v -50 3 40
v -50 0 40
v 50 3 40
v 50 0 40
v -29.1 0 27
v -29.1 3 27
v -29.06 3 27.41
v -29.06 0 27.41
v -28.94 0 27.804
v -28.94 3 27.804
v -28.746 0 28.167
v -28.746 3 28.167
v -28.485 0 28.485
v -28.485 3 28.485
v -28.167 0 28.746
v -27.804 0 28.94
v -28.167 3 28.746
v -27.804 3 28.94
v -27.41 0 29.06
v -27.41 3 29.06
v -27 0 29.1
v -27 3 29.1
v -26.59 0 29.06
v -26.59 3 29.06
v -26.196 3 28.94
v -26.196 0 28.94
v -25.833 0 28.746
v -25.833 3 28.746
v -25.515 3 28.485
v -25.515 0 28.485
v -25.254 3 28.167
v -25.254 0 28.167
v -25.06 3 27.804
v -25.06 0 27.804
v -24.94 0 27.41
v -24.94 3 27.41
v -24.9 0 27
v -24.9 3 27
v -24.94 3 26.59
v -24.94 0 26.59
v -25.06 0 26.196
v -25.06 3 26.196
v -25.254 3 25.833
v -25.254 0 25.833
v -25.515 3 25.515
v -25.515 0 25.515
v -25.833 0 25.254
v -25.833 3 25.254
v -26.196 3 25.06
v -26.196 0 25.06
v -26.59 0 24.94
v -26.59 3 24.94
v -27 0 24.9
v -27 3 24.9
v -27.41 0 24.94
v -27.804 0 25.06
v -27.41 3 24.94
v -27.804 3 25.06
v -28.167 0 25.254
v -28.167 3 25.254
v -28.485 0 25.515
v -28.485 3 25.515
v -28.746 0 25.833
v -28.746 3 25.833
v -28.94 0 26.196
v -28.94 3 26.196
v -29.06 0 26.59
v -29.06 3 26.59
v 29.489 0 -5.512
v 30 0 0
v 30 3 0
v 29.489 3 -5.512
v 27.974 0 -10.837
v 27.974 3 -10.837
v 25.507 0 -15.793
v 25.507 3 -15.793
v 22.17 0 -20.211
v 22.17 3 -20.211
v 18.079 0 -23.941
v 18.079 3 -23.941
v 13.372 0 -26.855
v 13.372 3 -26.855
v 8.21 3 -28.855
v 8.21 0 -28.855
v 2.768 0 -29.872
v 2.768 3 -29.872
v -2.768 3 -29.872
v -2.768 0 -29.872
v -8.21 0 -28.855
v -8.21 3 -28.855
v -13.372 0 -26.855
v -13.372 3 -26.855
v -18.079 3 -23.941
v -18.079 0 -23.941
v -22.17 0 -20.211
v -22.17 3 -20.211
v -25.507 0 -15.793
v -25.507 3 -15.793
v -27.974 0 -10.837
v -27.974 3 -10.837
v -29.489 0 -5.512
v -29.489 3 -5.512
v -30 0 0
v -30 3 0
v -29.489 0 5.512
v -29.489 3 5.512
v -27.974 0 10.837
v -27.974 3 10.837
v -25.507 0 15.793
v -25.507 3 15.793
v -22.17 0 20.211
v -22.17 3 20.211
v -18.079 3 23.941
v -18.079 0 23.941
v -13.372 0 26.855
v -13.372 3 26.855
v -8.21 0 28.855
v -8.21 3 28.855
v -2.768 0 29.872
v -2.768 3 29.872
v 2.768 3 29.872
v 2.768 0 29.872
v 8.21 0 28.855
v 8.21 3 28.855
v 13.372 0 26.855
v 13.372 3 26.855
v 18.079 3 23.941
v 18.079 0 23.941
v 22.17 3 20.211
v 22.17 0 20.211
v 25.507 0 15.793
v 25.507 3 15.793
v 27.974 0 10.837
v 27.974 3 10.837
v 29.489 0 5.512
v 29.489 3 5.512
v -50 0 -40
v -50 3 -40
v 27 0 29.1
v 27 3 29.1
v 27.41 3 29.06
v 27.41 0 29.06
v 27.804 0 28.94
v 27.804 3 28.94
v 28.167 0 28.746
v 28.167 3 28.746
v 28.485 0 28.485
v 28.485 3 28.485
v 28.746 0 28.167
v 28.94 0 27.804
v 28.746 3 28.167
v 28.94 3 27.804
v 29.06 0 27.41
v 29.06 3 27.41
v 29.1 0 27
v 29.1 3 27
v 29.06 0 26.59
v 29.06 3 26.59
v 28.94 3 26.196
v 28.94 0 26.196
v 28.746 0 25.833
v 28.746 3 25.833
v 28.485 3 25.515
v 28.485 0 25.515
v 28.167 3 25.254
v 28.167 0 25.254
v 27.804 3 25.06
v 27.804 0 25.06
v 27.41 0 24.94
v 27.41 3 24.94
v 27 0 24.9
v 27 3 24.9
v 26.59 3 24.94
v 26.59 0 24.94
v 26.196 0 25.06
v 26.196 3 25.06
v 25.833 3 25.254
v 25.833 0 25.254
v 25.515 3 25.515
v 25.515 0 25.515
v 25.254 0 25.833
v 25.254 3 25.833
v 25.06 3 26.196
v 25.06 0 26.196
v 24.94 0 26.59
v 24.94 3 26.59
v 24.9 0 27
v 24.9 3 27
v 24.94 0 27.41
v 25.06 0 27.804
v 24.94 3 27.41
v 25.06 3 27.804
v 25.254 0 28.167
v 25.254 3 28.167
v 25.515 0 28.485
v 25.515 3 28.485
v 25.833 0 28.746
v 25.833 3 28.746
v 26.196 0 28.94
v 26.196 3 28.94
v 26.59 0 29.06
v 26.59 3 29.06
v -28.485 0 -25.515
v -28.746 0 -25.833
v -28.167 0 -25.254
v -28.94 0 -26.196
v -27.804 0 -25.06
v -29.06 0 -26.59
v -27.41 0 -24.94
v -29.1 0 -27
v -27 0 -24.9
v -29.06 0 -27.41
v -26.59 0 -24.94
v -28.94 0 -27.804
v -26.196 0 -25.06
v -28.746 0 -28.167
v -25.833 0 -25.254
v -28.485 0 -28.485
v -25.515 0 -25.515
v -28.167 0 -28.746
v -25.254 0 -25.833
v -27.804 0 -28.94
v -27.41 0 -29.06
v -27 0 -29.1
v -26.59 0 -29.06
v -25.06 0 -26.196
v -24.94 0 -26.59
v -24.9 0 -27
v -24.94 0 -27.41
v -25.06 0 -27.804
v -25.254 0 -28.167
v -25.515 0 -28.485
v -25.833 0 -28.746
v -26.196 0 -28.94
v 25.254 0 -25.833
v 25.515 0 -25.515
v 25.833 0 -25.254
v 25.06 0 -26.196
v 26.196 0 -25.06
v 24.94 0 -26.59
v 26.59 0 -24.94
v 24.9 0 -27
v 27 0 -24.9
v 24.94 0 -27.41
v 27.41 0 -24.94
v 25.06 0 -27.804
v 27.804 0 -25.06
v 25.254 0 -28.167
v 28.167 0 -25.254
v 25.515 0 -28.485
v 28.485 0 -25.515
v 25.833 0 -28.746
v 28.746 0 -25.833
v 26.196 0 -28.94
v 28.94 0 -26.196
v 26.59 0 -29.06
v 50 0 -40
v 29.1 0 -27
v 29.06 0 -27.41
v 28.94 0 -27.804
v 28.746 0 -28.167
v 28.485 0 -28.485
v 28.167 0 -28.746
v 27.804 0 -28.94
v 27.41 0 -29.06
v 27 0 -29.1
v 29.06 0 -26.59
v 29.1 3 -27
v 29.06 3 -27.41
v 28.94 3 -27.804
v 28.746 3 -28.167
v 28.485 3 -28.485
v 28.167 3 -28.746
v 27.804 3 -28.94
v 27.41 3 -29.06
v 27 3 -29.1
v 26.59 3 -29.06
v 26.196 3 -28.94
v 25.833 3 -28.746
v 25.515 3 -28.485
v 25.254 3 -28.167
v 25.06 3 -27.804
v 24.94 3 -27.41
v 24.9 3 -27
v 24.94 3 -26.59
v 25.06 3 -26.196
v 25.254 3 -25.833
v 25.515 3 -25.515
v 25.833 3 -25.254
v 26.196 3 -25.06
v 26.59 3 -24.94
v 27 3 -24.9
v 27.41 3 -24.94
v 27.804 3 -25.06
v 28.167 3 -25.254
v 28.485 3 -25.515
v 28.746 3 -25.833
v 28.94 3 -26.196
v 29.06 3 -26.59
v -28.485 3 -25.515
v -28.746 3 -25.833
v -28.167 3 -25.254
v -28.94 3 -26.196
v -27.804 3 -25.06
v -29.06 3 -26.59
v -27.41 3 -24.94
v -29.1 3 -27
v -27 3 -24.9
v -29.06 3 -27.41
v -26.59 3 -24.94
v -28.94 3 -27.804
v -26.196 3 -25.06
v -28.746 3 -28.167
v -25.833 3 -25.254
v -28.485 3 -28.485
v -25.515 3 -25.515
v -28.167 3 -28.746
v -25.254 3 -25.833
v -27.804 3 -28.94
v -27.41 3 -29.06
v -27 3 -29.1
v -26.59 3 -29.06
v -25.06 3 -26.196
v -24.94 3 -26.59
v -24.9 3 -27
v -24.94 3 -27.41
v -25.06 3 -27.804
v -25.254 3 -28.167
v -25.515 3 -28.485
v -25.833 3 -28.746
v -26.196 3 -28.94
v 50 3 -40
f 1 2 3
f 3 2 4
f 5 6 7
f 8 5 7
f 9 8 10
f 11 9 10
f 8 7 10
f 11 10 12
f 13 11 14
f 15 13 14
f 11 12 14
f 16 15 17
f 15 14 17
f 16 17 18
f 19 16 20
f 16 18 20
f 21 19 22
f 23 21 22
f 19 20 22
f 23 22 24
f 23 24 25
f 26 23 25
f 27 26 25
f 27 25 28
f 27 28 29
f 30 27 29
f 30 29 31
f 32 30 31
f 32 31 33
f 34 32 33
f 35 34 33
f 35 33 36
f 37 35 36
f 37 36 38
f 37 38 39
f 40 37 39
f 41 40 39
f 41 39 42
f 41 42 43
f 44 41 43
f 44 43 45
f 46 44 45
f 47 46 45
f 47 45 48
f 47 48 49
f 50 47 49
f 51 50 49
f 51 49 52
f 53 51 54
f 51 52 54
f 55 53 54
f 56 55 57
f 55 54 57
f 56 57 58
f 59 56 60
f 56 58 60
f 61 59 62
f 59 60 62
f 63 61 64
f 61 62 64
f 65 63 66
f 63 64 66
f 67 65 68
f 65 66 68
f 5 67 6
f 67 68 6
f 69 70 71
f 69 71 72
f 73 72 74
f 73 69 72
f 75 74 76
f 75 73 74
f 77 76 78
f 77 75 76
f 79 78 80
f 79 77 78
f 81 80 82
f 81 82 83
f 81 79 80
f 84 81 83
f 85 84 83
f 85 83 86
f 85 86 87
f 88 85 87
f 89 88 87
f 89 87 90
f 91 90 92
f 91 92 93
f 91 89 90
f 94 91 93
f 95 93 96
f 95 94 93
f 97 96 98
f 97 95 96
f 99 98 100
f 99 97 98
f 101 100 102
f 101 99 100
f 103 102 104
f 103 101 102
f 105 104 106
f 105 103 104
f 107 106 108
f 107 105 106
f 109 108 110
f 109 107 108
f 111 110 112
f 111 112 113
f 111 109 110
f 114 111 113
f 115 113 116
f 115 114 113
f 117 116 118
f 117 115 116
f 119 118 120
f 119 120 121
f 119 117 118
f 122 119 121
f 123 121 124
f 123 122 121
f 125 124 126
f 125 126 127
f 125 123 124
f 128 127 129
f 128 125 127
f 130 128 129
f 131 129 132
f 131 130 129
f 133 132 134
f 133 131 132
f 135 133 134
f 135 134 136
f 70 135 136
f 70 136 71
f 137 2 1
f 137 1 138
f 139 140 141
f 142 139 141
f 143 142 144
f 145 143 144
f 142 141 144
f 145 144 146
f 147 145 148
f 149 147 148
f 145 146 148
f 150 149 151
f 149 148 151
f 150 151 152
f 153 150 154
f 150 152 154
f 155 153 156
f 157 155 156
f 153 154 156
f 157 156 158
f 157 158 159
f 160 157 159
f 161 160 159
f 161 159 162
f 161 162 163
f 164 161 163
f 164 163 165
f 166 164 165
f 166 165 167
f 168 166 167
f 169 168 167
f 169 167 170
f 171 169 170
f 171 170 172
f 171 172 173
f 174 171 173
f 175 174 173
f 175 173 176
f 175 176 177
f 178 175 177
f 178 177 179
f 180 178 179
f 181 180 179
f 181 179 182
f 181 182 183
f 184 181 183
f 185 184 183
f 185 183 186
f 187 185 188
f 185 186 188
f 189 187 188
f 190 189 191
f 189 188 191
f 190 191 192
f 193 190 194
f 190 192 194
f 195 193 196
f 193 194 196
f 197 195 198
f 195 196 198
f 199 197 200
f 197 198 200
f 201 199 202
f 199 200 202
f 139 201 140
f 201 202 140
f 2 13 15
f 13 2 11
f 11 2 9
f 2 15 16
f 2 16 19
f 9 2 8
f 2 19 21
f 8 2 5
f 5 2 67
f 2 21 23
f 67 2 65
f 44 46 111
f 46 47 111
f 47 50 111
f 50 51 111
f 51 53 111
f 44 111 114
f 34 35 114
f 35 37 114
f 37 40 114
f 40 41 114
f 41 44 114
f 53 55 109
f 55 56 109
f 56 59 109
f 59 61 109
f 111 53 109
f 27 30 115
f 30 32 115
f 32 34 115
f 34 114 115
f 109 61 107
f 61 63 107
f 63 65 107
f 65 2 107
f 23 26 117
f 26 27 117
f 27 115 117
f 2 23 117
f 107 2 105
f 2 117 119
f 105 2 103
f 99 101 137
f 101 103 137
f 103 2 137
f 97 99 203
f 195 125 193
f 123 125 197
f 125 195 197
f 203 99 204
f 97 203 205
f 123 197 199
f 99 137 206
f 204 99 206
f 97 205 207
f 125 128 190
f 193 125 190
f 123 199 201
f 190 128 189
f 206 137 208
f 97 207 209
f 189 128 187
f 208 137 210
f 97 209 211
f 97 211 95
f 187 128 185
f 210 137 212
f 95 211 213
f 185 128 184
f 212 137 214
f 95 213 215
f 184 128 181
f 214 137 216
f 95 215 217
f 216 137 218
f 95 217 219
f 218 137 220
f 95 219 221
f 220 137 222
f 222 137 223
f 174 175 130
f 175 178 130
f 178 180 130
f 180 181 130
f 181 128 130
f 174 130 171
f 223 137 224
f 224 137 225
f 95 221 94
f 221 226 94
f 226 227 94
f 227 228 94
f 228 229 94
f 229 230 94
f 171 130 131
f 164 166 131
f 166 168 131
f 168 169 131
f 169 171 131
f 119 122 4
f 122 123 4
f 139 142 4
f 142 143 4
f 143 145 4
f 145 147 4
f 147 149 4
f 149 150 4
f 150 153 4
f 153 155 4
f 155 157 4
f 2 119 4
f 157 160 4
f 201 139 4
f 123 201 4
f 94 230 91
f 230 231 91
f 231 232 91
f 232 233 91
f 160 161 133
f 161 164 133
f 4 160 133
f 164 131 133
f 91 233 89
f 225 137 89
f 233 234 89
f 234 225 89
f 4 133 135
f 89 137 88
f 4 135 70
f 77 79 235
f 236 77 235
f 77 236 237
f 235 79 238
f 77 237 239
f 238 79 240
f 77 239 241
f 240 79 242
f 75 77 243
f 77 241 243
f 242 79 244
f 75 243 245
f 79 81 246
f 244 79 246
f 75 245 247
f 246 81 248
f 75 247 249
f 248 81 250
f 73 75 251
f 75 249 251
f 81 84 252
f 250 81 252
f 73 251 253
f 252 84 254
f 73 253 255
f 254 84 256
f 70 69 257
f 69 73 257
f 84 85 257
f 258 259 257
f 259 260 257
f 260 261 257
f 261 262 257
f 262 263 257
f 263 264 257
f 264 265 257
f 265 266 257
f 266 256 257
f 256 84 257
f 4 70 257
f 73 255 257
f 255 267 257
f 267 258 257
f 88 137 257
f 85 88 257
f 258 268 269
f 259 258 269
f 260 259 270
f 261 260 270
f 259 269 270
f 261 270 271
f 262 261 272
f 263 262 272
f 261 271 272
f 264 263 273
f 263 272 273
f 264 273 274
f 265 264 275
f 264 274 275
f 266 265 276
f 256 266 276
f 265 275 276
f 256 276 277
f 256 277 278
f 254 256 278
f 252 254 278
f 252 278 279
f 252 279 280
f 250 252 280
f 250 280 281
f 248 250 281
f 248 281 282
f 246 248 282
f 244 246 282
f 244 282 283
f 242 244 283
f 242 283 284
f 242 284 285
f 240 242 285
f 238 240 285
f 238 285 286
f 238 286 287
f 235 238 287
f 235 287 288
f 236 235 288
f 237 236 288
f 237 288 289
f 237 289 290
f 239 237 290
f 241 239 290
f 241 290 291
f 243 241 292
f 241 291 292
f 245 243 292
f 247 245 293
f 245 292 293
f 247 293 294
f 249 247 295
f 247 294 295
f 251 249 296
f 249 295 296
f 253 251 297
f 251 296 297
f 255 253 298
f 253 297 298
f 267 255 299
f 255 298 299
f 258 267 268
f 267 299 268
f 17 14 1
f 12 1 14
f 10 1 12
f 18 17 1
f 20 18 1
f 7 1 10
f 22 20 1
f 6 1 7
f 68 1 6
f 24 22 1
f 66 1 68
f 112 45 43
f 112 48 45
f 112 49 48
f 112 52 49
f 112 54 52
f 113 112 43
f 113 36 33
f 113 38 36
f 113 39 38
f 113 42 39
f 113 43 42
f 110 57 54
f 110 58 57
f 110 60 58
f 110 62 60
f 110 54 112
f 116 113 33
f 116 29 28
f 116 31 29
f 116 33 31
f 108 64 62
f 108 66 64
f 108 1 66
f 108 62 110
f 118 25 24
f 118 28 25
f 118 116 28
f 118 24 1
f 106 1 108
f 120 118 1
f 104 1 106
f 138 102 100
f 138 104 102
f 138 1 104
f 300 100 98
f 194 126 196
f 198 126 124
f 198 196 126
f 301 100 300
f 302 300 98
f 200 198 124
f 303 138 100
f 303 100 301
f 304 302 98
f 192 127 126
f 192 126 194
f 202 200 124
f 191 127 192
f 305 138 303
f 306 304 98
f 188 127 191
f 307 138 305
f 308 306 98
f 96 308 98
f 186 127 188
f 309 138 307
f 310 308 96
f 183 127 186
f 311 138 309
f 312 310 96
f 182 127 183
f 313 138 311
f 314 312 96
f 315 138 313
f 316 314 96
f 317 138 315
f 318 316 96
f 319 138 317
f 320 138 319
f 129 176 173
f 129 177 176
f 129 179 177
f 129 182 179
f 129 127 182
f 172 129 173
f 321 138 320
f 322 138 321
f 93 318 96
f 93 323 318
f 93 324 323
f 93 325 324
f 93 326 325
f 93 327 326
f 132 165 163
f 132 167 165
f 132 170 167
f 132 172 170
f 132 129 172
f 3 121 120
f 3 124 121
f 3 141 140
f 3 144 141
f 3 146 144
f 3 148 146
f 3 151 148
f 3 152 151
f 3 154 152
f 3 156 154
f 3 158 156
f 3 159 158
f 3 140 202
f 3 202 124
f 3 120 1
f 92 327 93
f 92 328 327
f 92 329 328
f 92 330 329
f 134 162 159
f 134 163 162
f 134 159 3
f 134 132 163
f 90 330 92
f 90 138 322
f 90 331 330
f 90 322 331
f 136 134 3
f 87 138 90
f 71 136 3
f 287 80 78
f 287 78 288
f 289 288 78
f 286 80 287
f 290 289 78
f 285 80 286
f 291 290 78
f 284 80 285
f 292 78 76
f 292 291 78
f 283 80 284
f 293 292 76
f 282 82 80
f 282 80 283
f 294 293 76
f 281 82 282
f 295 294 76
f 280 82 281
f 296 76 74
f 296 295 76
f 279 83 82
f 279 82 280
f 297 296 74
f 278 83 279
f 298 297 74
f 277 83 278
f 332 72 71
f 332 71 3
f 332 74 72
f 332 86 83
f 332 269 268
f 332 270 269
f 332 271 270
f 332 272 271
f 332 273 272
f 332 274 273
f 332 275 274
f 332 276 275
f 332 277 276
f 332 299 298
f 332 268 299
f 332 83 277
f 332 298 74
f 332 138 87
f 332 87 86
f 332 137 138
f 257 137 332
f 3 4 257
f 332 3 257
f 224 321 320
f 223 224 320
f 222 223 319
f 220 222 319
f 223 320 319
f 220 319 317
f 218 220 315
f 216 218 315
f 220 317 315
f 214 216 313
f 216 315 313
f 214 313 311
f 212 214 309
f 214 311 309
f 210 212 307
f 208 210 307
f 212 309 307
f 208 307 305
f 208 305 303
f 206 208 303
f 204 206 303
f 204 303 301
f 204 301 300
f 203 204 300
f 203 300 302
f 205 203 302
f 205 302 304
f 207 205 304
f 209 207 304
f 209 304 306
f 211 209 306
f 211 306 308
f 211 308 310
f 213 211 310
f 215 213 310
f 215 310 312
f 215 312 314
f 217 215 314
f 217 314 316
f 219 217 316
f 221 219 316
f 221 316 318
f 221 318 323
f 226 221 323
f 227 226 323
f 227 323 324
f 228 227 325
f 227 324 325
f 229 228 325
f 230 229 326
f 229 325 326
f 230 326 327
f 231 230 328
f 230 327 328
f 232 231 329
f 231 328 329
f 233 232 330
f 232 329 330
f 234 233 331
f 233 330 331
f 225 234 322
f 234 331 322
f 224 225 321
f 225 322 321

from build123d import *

# Parameters (mm, degrees)
SKETCH_1_W               = 100
SKETCH_1_H               = 80
SKETCH_1_R               = 30
EXTRUDE_1_DEPTH          = 3
SKETCH_2_R               = 2.1
CUT_EXTRUDE_1_DEPTH      = 10
PATTERN_CIRCULAR_1_COUNT = 4


with BuildPart() as part:
    # 草图1 → 凸台-拉伸1 (new body)
    with BuildSketch(Plane(origin=(0, 0, 0), x_dir=(1, 0, 0), z_dir=(0, 1, 0))):
        Rectangle(SKETCH_1_W, SKETCH_1_H)
        Circle(SKETCH_1_R, mode=Mode.SUBTRACT)
    extrude(amount=EXTRUDE_1_DEPTH)

    # 草图2 → 切除-拉伸1 (cut)
    with BuildSketch(Plane(origin=(0, 3, 0), x_dir=(1, 0, 0), z_dir=(0, 1, 0))):
        with Locations((27, 27)):
            Circle(SKETCH_2_R)
    cut_extrude_1 = extrude(amount=-CUT_EXTRUDE_1_DEPTH, mode=Mode.SUBTRACT)

    # 阵列(圆周)1: 切除-拉伸1 ×4 about axis
    pattern_circular_1_axis = Axis((0, 0, 0), (0, 1, 0))
    for i in range(1, PATTERN_CIRCULAR_1_COUNT):
        add(cut_extrude_1.rotate(pattern_circular_1_axis, i * 360 / PATTERN_CIRCULAR_1_COUNT), mode=Mode.SUBTRACT)


solid = part.part
